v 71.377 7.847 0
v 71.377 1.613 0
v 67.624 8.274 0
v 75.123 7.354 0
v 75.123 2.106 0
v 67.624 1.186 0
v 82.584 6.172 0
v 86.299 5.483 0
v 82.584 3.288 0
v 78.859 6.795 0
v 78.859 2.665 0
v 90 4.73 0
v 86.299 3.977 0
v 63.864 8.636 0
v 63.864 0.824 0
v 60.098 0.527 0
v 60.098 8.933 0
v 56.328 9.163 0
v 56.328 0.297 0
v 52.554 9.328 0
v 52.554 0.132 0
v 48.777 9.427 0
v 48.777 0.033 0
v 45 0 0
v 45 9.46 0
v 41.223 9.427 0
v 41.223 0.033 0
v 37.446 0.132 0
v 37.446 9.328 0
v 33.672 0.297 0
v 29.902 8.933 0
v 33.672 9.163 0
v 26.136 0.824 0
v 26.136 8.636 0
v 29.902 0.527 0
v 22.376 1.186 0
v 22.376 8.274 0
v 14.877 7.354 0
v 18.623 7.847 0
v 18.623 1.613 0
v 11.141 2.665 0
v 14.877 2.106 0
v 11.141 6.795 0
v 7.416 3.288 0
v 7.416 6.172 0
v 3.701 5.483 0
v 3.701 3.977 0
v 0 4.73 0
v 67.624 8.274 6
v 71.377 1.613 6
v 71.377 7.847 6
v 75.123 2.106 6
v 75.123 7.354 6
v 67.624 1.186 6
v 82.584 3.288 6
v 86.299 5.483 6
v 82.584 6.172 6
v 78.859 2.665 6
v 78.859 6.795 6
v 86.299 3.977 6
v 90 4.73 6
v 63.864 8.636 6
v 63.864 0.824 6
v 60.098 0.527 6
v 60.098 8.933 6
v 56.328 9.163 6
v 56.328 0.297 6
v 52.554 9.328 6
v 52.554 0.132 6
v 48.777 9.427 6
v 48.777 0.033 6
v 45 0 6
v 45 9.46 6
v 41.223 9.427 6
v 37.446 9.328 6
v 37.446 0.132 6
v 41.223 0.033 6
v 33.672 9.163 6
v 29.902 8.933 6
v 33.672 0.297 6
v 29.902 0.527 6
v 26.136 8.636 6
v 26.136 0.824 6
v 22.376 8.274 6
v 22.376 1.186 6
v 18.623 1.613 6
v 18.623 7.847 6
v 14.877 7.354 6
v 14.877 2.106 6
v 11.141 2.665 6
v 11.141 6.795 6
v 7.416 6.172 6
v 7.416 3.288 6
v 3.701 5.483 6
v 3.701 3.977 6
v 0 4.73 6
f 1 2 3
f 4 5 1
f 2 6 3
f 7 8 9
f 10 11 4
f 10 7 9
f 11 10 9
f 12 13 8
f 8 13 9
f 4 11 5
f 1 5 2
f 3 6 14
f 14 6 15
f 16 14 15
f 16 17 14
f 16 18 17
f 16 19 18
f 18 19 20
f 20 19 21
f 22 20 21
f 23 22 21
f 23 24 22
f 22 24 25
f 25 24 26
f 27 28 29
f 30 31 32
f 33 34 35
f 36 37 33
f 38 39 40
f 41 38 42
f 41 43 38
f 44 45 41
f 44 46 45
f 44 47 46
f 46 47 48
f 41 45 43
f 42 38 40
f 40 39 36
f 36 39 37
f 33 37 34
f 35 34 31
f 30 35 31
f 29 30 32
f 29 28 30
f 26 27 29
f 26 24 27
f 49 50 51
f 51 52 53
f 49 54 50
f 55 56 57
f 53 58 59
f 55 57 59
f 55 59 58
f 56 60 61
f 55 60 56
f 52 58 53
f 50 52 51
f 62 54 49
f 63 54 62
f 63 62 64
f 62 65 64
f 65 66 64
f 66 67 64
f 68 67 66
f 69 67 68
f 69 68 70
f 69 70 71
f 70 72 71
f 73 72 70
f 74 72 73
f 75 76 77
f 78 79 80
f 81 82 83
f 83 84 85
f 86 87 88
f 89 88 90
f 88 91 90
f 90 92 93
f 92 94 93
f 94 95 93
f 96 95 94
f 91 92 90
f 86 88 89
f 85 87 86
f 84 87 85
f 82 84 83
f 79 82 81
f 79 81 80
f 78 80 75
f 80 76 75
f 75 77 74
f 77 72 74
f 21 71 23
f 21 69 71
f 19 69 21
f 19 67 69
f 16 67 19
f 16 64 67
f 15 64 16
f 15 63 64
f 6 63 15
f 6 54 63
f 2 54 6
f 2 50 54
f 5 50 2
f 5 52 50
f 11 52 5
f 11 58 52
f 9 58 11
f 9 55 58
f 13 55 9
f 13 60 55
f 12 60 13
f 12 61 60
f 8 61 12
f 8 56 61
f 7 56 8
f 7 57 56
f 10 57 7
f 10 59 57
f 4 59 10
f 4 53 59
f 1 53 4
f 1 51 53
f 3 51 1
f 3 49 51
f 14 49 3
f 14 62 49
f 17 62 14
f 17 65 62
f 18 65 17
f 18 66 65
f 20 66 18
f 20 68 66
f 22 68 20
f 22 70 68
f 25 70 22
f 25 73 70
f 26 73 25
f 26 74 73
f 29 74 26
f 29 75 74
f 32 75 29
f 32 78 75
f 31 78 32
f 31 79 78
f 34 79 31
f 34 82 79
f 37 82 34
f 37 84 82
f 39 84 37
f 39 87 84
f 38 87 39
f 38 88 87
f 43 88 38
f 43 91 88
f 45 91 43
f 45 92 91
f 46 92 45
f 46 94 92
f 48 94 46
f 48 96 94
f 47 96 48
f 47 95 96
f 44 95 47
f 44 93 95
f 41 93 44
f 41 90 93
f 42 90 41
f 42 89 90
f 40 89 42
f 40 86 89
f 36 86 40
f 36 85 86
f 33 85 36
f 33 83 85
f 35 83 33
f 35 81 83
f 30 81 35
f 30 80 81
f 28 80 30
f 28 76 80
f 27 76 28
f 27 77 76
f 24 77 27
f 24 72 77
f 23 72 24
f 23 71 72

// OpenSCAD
$fn = 32;

// ----------------------------------------------------------------------
// Arc profile plate: lens, 48 points
// ----------------------------------------------------------------------

// --- parameters (mm) ---
lens_chord = 90;          // chord length of the lens, X
arc_r = 216.44;           // radius of both arcs
arc_angle = 24;           // angle of each arc, degrees
sagitta = 4.73;           // bulge of each arc (half the lens height)
arc_step = 1;             // sampling step of the arcs, degrees
plate_t = 6;              // plate thickness, Z
fit_tol = 0.1;            // declared fit tolerance (prompt contract)
free_tol = 0.5;           // declared free tolerance (prompt contract)

bbox_y = 2 * sagitta;  // full lens height

profile = [[90, 4.73], [86.299, 5.483], [82.584, 6.172], [78.859, 6.795], [75.123, 7.354], [71.377, 7.847], [67.624, 8.274], [63.864, 8.636], [60.098, 8.933], [56.328, 9.163], [52.554, 9.328], [48.777, 9.427], [45, 9.46], [41.223, 9.427], [37.446, 9.328], [33.672, 9.163], [29.902, 8.933], [26.136, 8.636], [22.376, 8.274], [18.623, 7.847], [14.877, 7.354], [11.141, 6.795], [7.416, 6.172], [3.701, 5.483], [0, 4.73], [3.701, 3.977], [7.416, 3.288], [11.141, 2.665], [14.877, 2.106], [18.623, 1.613], [22.376, 1.186], [26.136, 0.824], [29.902, 0.527], [33.672, 0.297], [37.446, 0.132], [41.223, 0.033], [45, 0], [48.777, 0.033], [52.554, 0.132], [56.328, 0.297], [60.098, 0.527], [63.864, 0.824], [67.624, 1.186], [71.377, 1.613], [75.123, 2.106], [78.859, 2.665], [82.584, 3.288], [86.299, 3.977]];  // primary outline, 48 points, counter clockwise

// --- the one profile operation ---
linear_extrude(height = plate_t) polygon(points = profile);
